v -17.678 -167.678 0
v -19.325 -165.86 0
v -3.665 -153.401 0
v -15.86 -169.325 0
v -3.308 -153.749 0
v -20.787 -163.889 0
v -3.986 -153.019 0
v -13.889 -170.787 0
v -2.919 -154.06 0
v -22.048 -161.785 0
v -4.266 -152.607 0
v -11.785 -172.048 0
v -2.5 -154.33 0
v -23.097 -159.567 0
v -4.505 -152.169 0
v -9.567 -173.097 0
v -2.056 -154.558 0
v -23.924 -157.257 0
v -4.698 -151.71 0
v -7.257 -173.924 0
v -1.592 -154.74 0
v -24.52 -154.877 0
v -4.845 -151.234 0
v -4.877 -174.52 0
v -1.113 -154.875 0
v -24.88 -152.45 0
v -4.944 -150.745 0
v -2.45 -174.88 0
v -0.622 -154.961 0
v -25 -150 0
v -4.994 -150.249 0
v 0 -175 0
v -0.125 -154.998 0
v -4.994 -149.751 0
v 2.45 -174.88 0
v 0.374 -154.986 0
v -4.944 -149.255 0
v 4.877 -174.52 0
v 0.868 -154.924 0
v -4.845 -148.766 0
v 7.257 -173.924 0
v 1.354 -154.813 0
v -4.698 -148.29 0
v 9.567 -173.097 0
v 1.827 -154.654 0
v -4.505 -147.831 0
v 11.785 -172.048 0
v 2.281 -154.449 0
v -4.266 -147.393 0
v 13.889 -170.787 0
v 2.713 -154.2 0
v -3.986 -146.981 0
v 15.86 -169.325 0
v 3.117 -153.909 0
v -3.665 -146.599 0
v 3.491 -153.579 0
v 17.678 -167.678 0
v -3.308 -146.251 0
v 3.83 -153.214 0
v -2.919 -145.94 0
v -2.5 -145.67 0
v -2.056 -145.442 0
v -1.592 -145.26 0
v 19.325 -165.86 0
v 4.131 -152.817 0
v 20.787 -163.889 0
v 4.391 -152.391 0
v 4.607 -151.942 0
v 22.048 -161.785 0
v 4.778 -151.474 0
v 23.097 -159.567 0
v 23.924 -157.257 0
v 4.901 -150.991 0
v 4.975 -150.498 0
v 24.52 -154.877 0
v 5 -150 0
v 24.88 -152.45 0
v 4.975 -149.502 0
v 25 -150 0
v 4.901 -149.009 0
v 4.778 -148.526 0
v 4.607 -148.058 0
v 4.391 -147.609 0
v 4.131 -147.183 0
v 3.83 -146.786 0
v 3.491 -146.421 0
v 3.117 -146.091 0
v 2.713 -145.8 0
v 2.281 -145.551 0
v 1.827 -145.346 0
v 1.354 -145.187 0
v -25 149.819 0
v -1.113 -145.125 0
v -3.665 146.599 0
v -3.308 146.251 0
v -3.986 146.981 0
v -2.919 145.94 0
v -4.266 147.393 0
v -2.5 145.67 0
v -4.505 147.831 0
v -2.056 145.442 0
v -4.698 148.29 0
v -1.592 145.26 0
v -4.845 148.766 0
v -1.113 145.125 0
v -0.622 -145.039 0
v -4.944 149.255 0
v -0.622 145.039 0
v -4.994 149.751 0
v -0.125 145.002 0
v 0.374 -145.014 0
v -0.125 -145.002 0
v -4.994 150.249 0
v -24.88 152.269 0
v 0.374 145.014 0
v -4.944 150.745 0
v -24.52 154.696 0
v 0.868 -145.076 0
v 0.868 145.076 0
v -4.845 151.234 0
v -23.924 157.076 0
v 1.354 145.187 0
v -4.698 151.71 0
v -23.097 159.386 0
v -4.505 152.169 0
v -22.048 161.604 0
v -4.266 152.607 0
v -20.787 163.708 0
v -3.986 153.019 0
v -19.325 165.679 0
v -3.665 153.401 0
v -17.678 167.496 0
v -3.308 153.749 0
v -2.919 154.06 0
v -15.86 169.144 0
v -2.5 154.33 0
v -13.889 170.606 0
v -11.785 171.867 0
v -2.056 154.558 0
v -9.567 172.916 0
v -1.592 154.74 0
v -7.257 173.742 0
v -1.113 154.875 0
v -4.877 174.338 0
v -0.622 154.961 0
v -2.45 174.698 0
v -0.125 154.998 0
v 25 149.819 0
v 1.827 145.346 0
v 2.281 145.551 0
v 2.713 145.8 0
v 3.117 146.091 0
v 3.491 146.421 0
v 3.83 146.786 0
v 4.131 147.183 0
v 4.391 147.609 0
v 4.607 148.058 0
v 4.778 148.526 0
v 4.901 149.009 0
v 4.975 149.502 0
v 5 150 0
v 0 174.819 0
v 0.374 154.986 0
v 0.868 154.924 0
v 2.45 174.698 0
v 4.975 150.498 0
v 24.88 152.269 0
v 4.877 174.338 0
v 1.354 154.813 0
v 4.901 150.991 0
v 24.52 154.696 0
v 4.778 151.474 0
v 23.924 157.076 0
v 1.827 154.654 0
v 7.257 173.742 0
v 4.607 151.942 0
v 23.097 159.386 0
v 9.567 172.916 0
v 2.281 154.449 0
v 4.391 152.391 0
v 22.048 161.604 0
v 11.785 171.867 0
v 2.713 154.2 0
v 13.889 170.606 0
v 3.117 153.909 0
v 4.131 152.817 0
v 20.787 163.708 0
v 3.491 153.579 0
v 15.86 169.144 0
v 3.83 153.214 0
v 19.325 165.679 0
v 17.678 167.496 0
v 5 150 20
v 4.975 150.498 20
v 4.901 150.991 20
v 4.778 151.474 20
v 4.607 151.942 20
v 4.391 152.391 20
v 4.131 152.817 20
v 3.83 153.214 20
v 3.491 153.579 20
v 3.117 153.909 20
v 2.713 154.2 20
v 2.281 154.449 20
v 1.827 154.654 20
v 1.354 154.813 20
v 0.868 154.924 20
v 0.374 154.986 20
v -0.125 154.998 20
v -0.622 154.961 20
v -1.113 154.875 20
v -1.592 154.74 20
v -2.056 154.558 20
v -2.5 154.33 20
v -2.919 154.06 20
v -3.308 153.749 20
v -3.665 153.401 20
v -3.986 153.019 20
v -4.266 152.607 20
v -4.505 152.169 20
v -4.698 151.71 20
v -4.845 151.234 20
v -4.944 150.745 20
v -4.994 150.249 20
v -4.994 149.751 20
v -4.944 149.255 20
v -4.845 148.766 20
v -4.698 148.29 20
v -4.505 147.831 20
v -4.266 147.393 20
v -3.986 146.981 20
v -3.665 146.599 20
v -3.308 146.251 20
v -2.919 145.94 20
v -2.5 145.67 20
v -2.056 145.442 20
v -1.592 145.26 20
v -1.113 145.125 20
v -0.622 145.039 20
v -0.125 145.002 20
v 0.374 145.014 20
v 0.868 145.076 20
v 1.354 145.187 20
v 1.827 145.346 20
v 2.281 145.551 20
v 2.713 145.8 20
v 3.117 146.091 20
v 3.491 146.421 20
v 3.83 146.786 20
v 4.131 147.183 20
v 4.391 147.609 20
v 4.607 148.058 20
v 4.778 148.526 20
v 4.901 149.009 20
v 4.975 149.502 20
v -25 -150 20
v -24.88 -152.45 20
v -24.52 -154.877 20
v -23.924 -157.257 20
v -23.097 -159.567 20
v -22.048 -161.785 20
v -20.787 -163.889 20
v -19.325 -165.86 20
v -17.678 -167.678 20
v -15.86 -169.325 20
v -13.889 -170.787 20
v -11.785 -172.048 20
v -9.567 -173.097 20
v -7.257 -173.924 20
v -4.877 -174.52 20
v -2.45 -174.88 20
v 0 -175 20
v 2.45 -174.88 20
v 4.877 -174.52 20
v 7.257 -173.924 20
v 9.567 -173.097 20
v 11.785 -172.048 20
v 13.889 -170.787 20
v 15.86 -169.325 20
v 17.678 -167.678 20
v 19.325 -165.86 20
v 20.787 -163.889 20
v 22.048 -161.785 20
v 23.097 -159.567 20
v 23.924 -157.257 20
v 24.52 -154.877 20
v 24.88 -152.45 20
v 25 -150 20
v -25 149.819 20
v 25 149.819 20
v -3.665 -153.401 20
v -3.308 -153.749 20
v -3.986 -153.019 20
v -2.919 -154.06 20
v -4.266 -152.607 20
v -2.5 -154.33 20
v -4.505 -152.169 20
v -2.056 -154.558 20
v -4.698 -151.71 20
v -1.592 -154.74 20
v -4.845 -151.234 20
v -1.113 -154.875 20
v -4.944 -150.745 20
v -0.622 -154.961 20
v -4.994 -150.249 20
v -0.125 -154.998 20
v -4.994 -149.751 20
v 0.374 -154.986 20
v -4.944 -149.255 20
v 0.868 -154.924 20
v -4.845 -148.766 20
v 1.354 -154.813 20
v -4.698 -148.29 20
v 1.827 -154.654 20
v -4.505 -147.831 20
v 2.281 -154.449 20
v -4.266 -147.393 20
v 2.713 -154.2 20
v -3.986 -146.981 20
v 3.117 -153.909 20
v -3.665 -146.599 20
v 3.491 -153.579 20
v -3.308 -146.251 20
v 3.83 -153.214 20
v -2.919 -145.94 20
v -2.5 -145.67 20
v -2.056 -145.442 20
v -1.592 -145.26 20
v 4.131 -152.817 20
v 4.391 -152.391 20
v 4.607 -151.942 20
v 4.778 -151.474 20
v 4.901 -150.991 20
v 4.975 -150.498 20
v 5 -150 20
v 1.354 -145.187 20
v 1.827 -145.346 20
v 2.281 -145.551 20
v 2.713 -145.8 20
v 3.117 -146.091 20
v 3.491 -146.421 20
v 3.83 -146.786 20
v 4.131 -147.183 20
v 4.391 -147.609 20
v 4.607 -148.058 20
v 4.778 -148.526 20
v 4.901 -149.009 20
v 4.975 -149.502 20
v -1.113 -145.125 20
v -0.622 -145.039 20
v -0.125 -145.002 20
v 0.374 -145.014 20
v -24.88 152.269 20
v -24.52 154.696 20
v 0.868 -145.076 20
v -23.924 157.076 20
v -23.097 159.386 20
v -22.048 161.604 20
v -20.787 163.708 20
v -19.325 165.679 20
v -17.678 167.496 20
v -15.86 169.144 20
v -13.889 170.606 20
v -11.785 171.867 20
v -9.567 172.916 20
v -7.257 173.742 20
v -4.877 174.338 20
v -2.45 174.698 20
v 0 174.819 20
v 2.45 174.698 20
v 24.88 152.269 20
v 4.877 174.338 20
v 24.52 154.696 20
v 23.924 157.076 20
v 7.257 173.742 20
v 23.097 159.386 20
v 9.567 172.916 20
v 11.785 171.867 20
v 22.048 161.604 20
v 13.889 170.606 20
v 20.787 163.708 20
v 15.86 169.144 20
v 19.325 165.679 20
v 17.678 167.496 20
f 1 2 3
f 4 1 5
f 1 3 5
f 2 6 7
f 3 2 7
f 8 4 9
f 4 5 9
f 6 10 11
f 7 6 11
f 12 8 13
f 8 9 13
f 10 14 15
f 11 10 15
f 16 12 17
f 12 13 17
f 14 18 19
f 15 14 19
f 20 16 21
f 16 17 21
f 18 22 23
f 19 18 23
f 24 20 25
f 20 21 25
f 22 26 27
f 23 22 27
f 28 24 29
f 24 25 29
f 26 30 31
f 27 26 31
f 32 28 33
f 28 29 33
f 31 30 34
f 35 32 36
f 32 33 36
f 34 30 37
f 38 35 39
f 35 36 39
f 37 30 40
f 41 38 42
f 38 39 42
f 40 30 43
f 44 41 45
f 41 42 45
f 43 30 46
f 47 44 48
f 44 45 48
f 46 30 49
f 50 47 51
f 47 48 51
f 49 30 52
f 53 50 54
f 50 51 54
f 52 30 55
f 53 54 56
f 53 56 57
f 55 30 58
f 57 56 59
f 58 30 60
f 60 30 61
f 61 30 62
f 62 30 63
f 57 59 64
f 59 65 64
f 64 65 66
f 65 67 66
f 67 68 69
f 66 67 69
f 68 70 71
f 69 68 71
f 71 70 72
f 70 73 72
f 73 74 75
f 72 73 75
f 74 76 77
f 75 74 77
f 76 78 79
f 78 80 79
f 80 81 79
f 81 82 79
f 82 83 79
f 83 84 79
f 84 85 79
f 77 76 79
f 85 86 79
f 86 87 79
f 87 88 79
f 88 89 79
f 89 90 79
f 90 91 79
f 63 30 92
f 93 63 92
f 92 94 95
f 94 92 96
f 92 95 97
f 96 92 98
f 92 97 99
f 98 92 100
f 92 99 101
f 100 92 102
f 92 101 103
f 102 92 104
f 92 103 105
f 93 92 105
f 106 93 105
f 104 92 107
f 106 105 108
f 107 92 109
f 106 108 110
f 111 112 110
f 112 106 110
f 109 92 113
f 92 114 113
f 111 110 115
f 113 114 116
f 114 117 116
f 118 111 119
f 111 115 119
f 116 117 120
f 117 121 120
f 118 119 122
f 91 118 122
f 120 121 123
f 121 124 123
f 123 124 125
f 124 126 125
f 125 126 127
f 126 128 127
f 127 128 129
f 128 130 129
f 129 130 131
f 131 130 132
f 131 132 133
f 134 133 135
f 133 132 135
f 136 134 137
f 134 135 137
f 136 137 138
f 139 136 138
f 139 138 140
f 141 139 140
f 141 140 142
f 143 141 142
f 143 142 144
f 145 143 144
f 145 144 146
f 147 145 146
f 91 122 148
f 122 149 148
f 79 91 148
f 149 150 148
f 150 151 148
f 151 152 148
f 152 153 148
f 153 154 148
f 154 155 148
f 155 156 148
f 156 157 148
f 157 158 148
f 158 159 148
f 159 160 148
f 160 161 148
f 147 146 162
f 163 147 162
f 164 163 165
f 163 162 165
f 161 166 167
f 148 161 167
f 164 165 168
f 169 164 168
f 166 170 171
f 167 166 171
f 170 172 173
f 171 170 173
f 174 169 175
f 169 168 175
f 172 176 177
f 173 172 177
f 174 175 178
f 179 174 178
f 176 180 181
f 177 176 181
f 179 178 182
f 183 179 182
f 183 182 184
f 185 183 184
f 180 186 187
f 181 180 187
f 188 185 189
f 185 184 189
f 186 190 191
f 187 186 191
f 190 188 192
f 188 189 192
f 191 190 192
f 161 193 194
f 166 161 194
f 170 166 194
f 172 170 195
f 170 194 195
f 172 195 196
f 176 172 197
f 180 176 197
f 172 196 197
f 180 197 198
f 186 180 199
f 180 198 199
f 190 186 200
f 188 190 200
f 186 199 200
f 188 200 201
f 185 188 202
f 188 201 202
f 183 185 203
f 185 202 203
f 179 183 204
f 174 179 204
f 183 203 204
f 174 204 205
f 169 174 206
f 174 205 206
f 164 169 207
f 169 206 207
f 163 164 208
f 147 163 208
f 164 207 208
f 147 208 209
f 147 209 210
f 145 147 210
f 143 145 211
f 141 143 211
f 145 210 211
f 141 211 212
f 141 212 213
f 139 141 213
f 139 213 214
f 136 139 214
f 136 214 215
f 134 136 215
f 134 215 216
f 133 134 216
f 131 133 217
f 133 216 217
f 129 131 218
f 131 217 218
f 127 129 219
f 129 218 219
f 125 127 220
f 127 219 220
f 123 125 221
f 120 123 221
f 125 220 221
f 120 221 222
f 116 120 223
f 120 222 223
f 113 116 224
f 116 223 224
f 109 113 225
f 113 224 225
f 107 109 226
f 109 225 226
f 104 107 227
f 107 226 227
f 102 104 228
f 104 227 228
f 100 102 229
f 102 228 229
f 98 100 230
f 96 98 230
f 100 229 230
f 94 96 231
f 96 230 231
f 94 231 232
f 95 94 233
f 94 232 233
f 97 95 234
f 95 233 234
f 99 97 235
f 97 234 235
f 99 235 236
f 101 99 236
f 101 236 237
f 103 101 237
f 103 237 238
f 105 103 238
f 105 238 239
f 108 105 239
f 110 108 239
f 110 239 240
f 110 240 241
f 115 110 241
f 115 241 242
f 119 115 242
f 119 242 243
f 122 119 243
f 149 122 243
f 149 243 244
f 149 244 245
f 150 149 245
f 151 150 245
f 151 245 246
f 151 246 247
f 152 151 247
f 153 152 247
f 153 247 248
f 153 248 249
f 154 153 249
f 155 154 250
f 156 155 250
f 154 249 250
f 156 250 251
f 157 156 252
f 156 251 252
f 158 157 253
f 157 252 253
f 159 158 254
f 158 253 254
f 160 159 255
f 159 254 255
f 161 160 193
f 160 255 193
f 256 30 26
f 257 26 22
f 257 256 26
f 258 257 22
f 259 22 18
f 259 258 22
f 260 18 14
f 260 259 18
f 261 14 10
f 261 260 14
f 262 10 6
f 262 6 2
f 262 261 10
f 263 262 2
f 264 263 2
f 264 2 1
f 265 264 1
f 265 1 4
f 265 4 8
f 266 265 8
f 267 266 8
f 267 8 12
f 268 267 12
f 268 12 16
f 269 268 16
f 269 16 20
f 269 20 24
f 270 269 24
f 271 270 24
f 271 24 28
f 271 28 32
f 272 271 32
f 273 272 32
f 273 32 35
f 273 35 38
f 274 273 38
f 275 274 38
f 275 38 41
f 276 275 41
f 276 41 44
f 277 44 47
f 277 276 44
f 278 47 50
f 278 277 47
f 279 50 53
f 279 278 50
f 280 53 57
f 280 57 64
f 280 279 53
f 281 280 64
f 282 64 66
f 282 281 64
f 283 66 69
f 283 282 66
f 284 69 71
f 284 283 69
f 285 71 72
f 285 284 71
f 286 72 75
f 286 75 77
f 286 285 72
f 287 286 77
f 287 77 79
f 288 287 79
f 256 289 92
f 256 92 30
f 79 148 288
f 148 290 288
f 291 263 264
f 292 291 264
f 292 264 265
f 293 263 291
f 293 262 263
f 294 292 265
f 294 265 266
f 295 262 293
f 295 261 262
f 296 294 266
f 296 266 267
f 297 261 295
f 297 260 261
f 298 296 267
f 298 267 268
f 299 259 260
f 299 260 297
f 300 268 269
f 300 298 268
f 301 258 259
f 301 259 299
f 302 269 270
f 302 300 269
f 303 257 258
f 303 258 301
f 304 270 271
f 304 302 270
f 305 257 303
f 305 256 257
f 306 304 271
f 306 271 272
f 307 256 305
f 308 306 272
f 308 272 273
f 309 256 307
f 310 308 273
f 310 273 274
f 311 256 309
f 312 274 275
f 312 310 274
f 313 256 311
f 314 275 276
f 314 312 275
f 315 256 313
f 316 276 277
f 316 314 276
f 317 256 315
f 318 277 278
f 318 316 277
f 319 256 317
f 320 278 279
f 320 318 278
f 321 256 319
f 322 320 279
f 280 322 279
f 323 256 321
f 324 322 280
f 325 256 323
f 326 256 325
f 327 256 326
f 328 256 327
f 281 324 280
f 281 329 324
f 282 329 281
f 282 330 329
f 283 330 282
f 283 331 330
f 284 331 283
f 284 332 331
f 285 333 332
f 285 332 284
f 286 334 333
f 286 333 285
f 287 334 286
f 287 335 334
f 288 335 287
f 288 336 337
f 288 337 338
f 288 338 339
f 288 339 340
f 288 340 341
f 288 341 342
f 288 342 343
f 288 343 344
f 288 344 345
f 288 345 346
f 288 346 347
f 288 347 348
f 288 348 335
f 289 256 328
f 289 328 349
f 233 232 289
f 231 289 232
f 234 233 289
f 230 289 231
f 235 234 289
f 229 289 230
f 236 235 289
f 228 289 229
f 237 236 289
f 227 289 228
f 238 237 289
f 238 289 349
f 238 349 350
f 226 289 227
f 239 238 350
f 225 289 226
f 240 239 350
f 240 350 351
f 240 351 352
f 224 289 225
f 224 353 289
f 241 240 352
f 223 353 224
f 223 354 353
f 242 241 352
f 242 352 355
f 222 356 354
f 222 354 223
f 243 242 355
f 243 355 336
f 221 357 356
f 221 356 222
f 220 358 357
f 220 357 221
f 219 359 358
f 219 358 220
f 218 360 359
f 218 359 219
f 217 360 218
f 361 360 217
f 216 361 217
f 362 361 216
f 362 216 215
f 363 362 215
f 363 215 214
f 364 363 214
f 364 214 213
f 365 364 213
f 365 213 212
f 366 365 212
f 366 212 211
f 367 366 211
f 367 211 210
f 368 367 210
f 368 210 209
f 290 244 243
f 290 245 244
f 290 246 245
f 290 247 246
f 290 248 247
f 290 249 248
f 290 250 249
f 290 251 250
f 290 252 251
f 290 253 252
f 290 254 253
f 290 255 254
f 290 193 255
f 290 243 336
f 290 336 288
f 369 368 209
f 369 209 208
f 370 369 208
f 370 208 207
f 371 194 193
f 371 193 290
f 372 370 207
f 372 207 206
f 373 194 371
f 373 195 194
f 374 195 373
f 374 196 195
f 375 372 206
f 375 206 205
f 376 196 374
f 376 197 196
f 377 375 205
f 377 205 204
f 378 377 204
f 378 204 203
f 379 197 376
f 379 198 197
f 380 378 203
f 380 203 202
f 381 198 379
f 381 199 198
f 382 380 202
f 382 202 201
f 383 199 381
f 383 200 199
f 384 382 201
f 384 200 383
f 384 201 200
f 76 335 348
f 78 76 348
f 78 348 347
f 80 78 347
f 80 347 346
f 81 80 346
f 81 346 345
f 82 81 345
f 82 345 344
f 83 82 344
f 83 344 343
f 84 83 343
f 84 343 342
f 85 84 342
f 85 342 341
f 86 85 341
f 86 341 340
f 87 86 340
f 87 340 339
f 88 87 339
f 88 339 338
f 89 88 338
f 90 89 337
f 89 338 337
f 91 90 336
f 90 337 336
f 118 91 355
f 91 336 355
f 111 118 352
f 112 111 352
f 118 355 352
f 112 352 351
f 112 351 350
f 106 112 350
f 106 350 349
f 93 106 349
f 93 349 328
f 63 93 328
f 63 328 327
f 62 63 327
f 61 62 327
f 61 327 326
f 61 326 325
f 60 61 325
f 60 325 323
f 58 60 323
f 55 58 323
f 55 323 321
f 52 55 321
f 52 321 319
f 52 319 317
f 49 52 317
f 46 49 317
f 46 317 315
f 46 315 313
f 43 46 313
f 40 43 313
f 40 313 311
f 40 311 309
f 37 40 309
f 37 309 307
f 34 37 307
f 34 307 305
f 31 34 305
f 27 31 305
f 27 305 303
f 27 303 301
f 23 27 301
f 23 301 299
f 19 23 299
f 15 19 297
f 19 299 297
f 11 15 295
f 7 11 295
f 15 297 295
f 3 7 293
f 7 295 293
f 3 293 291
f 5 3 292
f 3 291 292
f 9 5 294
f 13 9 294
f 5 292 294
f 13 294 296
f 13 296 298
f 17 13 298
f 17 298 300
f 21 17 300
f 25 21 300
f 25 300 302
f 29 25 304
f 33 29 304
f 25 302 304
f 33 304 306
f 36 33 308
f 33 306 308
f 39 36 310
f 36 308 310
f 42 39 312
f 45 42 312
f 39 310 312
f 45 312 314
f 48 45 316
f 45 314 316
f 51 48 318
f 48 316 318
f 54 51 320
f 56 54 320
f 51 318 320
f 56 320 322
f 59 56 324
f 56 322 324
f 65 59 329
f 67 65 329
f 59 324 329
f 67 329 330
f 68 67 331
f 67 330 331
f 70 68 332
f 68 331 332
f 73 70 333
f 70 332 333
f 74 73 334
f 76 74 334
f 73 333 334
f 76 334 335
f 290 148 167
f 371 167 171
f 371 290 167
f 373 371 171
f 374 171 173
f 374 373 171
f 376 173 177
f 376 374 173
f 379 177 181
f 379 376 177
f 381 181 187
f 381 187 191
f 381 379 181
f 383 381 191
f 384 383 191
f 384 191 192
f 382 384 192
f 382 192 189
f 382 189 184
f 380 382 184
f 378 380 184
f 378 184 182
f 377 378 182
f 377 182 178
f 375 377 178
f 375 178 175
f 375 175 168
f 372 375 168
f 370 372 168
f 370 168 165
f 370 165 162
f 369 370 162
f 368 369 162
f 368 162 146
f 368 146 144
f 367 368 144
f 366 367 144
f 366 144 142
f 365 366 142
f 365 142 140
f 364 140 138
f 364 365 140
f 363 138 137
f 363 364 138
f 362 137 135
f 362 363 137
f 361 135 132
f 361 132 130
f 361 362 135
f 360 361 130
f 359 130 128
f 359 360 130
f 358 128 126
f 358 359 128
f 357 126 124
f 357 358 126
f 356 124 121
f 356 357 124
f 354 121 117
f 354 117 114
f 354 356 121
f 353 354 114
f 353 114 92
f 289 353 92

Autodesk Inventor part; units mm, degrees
ref_plane "YZ Plane" through (0, 0, 0) normal (1, 0, 0) x (0, 1, 0)
ref_plane "XZ Plane" through (0, 0, 0) normal (0, 1, 0) x (-1, 0, 0)
ref_plane "XY Plane" through (0, 0, 0) normal (0, 0, 1) x (1, 0, 0)
sketch "Sketch1" plane through (0, 0, 0) normal (0, 0, 1) x (1, 0, 0)
  line L0 (-7.5, 170) -> (7.5, 170)
  line L1 (7.5, 170) -> (7.5, -170)
  line L2 (7.5, -170) -> (-7.5, -170)
  line L3 (-7.5, -170) -> (-7.5, 170)
  line L4 (-10.5, 0) -> (10.5, 0) projected
  line L5 (0, -238) -> (0, 238) projected
  point P0 (0, 0)
  dimension "d4" = 7.5
  dimension "d5" = 7.5
  dimension "d6" = 170
  dimension "d7" = 170
extrude "Extrusion1" add sketch "Sketch1" along normal blind 20
sketch "Sketch2" plane through (0, 0, 20) normal (0, 0, 1) x (1, 0, 0)
  circle A0 centre (0, 150) radius 5
  circle A1 centre (0, -150) radius 5
  line L0 (-10.5, 0) -> (10.5, 0) projected
  line L1 (0, -238) -> (0, 238) projected
  point P0 (0, 0)
  dimension "d8" = 10
  dimension "d9" = 150
  dimension "d10" = 150
  dimension "d11" = 10
extrude "Extrusion2" cut sketch "Sketch2" against normal blind 180
sketch "Sketch3" plane through (0, 0, 20) normal (0, 0, 1) x (1, 0, 0)
  arc A0 (25, 149.8188) -> (-25, 149.8188) centre (0, 149.8188) ccw
  circle A1 centre (0, -150) radius 5 projected
  arc A2 (-25, -150) -> (25, -150) centre (0, -150) ccw
  line L0 (-25, 149.8188) -> (-25, -150)
  line L1 (25, 149.8188) -> (25, -150)
  line L2 (7.5, -170) -> (7.5, 170) projected
  point P0 (0, 0)
  dimension "d12" = 50
  dimension "d13" = 50
extrude "Extrusion3" add sketch "Sketch3" against normal blind 20
mirror "Mirror1" about plane through (0, 0, 0) normal (0, 1, 0) of "Extrusion2"
